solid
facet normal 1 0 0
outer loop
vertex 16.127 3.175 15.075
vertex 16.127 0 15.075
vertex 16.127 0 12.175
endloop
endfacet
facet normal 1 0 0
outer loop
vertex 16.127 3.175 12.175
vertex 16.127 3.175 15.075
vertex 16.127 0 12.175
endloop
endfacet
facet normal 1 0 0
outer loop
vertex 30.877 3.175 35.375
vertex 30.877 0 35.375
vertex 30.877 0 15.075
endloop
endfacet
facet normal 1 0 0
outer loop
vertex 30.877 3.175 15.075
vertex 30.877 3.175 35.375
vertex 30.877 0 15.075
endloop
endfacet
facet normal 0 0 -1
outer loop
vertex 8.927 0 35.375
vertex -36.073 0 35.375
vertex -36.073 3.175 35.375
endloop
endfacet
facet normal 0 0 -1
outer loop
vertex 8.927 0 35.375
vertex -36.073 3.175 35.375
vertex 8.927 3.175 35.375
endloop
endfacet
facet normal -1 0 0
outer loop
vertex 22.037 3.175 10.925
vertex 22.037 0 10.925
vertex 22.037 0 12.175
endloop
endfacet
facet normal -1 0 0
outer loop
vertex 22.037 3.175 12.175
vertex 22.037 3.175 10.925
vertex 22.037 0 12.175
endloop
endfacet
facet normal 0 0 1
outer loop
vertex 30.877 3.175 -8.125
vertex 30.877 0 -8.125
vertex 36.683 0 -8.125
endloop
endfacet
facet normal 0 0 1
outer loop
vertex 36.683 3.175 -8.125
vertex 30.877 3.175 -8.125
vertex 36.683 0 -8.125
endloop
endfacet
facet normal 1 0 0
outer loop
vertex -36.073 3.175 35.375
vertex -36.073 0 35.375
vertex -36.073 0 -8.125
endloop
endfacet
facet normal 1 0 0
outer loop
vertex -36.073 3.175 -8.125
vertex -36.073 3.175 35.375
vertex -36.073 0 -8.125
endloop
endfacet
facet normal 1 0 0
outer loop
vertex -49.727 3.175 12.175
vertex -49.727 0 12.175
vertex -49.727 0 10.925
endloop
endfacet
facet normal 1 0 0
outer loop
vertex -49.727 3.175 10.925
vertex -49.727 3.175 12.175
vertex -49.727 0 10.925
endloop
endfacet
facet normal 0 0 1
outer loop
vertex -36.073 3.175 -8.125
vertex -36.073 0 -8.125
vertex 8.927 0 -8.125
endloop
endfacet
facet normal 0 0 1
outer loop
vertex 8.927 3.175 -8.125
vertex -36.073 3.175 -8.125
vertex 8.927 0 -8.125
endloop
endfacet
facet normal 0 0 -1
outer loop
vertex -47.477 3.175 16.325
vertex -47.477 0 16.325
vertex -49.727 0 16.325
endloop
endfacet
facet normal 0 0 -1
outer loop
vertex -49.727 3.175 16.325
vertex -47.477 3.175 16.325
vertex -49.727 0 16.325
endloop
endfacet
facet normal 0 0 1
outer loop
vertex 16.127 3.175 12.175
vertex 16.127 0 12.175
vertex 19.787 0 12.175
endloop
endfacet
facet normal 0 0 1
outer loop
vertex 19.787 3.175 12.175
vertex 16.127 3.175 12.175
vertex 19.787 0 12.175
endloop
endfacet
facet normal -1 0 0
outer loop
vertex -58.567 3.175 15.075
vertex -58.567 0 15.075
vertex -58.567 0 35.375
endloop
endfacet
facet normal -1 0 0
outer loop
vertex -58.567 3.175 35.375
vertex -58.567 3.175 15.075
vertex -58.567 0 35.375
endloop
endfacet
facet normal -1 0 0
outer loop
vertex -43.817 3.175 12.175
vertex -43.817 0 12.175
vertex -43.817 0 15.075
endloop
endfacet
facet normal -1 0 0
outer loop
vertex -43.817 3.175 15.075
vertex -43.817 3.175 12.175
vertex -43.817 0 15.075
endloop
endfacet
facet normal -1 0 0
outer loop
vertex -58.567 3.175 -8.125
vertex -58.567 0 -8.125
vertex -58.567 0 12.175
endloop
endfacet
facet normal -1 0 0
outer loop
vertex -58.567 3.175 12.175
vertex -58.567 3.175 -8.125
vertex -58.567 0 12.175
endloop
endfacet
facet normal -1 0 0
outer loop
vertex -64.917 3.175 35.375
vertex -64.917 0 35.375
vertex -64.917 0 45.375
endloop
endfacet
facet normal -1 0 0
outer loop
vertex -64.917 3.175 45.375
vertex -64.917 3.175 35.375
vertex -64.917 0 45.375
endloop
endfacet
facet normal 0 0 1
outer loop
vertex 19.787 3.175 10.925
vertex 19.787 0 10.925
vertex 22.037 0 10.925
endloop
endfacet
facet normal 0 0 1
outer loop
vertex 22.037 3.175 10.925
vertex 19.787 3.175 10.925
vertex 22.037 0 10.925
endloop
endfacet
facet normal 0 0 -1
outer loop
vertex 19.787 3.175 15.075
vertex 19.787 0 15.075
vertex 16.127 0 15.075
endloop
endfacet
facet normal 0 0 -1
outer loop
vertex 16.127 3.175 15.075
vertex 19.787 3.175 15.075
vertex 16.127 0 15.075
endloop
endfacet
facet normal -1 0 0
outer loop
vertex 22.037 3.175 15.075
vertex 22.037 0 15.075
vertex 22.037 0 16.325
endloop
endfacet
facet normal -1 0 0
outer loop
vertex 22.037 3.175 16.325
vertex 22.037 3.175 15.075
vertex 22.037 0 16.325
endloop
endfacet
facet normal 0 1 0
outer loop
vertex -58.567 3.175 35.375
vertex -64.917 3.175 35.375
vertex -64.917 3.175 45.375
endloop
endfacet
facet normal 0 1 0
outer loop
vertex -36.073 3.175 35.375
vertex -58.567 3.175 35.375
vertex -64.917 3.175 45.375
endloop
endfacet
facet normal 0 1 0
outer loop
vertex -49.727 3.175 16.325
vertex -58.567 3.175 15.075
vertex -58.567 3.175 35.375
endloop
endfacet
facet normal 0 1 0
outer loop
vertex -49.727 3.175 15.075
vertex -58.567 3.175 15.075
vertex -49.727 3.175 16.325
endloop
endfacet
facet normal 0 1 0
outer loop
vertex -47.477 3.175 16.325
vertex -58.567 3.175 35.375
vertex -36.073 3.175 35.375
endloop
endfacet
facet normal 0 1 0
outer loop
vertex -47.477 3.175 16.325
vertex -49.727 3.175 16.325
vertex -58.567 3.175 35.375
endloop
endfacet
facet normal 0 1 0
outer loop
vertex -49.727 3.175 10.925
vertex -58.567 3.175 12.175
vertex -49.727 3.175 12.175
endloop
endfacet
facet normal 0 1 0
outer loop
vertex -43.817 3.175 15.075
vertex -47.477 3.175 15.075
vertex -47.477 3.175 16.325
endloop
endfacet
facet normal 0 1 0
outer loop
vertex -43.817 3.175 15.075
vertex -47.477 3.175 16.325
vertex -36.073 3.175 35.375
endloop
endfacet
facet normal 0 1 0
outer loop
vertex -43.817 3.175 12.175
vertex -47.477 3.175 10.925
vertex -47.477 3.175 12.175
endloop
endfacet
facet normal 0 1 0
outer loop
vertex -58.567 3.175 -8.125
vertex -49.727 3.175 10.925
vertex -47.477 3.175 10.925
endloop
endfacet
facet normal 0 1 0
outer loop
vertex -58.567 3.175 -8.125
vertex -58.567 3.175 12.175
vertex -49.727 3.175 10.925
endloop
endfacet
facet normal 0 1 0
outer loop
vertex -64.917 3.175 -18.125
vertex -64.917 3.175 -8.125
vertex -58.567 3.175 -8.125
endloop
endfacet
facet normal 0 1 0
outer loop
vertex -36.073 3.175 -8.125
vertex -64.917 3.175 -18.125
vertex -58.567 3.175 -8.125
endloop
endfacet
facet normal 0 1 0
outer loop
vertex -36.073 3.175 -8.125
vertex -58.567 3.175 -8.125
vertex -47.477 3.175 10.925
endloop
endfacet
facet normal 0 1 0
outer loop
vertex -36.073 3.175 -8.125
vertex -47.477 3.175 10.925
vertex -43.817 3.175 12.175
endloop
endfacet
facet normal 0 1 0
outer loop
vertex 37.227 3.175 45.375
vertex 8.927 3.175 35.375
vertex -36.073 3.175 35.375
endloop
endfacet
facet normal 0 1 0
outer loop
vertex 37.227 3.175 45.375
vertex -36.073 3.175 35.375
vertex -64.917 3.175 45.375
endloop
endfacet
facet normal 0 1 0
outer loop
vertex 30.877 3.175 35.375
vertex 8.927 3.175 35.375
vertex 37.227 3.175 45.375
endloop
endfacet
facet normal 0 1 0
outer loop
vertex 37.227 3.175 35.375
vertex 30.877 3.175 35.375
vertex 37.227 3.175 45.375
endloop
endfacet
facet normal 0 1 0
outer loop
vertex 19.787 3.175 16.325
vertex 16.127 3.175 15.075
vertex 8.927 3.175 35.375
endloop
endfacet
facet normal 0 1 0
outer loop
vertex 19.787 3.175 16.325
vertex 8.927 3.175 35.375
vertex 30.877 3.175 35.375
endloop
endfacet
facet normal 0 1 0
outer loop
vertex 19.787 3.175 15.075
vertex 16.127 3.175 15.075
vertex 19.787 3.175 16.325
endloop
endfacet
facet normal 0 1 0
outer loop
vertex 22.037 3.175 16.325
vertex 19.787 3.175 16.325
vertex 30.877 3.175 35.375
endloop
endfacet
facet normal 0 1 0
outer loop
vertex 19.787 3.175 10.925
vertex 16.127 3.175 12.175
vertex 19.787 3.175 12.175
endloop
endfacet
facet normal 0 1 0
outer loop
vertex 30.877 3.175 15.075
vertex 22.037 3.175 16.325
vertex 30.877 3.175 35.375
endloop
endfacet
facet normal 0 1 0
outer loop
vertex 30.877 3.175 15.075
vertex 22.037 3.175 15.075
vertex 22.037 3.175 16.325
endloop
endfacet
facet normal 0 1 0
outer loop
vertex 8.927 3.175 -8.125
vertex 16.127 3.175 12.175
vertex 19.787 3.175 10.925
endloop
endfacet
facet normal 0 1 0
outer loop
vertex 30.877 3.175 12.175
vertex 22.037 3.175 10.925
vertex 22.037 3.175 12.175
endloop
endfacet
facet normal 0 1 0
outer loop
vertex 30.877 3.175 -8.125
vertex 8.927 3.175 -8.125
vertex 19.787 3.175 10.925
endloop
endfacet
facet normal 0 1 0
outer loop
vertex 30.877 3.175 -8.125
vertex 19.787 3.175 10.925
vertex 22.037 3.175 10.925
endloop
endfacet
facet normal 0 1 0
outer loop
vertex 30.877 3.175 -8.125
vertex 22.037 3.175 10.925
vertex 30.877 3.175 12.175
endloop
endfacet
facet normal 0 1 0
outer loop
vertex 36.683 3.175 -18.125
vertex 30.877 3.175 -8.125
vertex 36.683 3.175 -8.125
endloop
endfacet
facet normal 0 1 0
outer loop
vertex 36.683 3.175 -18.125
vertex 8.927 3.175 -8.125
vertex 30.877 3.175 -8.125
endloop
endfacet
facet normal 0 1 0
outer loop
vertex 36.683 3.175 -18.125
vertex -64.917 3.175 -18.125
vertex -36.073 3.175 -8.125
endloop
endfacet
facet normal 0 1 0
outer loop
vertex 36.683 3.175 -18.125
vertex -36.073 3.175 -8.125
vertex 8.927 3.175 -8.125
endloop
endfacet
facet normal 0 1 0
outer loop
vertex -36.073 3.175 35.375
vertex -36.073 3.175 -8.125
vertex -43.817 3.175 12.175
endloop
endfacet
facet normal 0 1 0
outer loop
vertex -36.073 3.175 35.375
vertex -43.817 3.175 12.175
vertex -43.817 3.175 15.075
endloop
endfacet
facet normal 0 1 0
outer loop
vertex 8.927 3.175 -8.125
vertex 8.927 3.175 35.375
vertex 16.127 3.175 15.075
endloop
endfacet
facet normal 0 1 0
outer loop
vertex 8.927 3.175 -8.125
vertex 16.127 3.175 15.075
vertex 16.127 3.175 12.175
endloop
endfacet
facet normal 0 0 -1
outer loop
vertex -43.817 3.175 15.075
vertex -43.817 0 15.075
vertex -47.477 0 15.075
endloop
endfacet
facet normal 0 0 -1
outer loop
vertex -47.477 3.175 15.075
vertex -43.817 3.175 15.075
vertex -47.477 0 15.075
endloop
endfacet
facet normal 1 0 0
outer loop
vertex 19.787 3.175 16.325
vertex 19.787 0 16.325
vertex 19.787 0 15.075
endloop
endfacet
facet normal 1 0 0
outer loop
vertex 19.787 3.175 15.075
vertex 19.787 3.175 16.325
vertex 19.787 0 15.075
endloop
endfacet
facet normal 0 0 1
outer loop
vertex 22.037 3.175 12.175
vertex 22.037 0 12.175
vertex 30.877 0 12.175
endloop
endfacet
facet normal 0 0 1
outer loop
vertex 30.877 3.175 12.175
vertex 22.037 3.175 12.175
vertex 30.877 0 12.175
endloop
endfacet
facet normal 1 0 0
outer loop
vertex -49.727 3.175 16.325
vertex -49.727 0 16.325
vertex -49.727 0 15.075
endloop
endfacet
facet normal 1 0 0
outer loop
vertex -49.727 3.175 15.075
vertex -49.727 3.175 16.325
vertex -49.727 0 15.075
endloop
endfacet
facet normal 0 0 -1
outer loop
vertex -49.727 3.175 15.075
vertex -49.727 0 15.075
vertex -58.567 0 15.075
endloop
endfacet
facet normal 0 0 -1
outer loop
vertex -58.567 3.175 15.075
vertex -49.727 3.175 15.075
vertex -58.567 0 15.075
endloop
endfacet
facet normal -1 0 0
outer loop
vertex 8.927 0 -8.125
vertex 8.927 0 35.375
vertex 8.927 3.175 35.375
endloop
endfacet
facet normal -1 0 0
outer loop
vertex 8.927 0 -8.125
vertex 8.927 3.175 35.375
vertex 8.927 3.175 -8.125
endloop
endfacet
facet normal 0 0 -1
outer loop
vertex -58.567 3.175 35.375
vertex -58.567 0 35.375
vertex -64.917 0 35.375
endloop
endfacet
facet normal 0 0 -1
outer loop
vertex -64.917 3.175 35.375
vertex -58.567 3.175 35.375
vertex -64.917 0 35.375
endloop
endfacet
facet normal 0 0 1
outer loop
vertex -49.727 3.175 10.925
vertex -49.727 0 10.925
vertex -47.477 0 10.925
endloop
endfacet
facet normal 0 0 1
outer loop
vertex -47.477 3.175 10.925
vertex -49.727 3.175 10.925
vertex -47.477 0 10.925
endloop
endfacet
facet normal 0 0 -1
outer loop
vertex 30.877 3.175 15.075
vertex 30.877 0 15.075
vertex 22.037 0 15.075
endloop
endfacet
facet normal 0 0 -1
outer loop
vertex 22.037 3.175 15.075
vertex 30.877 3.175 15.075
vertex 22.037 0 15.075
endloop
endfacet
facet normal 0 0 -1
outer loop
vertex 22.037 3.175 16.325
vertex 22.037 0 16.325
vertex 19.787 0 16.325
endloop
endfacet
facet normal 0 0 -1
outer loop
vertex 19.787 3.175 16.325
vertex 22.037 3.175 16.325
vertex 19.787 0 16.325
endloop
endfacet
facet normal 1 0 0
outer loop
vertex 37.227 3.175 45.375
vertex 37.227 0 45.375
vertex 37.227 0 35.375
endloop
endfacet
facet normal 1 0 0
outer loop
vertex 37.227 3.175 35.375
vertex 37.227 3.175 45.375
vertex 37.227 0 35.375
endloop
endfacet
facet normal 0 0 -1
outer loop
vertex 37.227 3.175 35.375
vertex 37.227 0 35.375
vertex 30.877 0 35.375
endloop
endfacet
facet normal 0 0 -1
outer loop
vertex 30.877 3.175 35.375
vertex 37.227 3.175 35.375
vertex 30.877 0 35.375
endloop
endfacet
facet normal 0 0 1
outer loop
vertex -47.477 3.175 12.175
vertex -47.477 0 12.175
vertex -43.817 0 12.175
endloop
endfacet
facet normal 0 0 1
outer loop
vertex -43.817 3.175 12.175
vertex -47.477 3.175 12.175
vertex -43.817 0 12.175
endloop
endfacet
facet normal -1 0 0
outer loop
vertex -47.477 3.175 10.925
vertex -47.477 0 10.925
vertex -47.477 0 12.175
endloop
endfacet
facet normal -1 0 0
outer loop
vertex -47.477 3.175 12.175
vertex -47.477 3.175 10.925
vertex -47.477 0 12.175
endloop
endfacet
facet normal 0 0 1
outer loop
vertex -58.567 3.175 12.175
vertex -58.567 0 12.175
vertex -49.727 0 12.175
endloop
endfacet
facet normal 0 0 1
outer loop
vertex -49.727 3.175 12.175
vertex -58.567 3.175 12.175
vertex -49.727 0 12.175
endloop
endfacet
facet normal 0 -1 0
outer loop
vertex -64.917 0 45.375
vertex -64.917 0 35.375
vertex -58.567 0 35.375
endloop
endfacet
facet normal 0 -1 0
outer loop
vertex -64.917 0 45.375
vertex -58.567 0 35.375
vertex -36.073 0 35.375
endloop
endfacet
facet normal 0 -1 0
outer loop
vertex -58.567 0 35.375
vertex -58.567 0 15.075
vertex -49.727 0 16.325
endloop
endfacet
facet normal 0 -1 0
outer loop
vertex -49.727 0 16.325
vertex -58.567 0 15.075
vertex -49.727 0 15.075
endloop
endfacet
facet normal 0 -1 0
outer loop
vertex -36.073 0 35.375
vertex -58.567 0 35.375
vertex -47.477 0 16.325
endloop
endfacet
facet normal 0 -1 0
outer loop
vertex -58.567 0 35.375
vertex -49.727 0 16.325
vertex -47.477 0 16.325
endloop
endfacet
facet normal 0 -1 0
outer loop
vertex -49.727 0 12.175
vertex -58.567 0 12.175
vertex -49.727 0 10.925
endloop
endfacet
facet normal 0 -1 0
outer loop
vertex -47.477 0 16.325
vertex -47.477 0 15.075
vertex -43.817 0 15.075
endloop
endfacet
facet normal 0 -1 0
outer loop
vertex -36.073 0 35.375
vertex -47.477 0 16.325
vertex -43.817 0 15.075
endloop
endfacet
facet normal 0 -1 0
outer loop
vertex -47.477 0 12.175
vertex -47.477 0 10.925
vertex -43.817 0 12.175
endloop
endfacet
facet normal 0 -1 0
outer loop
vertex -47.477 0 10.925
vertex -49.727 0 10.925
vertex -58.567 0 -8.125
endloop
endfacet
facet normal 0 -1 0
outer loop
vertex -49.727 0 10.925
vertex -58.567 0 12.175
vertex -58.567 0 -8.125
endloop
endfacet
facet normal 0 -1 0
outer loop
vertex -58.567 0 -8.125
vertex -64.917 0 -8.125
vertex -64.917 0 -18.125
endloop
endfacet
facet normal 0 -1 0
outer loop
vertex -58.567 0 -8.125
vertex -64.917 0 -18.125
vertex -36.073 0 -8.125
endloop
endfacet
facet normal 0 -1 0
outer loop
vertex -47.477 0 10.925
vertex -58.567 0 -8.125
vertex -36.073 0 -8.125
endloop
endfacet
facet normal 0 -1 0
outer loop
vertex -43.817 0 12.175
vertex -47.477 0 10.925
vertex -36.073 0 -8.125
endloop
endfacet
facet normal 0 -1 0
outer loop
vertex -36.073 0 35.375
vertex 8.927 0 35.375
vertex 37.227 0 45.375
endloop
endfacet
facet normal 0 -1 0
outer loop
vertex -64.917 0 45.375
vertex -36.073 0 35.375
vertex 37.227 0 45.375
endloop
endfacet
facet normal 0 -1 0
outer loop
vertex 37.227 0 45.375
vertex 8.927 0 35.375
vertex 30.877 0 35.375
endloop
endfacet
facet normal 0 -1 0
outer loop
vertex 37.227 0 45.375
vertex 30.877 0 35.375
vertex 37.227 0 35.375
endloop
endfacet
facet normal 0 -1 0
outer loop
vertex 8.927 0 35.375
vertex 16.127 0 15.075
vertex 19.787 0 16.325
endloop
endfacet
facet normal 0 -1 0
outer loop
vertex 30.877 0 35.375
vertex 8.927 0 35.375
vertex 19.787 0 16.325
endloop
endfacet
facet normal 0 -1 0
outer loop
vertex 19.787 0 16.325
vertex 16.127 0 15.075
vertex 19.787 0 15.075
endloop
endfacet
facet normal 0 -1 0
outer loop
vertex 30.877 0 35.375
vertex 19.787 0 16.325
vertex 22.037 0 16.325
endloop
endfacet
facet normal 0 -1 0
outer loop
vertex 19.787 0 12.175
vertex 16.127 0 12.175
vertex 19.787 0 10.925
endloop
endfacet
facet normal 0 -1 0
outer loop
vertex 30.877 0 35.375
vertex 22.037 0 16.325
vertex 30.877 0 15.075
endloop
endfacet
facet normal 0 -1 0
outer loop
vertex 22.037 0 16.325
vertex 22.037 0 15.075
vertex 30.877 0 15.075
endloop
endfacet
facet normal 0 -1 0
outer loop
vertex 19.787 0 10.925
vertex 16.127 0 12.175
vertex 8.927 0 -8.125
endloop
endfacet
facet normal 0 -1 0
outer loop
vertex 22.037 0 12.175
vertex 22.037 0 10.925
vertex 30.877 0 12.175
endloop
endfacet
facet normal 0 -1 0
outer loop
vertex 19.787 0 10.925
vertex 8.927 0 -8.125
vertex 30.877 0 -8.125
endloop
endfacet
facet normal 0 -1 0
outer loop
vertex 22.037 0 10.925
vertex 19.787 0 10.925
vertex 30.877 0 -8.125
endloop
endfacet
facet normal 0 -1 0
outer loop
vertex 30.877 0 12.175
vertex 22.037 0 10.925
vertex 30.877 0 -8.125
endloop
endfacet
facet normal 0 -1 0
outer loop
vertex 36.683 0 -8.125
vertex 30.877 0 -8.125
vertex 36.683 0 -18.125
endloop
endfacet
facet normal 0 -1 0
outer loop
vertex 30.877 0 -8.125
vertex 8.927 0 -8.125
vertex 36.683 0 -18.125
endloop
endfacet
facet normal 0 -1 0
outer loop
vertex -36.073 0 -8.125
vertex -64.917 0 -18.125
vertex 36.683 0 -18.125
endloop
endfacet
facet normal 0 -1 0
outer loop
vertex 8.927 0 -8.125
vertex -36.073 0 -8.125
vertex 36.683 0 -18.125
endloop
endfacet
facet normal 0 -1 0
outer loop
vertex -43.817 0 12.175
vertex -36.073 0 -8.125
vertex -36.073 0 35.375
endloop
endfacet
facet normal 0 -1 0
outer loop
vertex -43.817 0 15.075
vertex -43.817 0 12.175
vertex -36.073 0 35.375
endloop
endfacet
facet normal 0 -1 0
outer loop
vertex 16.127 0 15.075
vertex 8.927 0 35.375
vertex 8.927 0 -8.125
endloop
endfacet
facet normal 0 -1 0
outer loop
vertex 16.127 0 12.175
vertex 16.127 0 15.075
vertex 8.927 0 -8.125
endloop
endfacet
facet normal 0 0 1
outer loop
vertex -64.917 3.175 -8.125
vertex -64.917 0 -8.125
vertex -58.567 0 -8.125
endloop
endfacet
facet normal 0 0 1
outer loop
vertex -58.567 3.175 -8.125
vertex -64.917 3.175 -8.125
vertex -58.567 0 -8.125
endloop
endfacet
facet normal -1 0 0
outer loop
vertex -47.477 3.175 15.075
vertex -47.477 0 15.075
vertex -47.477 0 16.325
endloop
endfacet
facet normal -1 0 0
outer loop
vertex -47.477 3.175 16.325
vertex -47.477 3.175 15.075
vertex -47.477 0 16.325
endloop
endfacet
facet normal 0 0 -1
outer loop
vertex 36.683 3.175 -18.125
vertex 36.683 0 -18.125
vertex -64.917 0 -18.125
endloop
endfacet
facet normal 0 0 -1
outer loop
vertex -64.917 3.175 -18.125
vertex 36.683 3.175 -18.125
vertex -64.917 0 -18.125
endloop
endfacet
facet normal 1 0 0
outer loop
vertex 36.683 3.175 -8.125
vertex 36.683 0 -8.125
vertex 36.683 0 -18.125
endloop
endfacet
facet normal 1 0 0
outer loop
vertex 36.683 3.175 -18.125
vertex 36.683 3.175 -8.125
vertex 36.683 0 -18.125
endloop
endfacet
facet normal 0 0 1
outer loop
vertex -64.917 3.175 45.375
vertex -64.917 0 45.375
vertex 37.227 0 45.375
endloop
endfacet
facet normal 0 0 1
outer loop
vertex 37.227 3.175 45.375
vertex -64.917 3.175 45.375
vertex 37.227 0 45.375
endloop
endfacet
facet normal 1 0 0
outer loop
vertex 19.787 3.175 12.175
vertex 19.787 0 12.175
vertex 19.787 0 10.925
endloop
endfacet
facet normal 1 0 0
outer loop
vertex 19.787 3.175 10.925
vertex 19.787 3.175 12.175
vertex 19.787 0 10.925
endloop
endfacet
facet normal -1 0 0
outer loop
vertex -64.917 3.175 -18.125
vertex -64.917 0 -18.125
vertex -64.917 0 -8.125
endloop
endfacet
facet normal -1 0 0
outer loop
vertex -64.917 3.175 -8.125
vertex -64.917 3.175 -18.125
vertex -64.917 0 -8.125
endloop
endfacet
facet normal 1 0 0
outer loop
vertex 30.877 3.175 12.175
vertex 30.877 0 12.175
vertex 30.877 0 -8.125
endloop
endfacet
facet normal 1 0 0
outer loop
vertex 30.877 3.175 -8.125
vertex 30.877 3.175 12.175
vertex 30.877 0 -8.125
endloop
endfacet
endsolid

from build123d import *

# Parameters (mm, degrees)
SKETCH1_W      = 45
SKETCH1_H      = 43.5
EXTRUDE1_DEPTH = 3.175


with BuildPart() as part:
    # Sketch1 → Extrude1 (new body)
    with BuildSketch(Plane(origin=(0, 0, 0), x_dir=(1, 0, 0), z_dir=(0, 1, 0))):
        Polygon((37.227457893, -45.375264395), (37.227457893, -35.375264395), (30.877457893, -35.375264395), (30.877457893, -15.075264395), (22.037457893, -15.075264395), (22.037457893, -16.325264395), (19.787457893, -16.325264395), (19.787457893, -15.075264395), (16.127457893, -15.075264395), (16.127457893, -12.175264395), (19.787457893, -12.175264395), (19.787457893, -10.925264395), (22.037457893, -10.925264395), (22.037457893, -12.175264395), (30.877457893, -12.175264395), (30.877457893, 8.124735605), (36.682921964, 8.124735605), (36.682921964, 18.124735605), (-64.917078036, 18.124735605), (-64.917078036, 8.124735605), (-58.567078036, 8.124735605), (-58.567078036, -12.175264395), (-49.727078036, -12.175264395), (-49.727078036, -10.925264395), (-47.477078036, -10.925264395), (-47.477078036, -12.175264395), (-43.817078036, -12.175264395), (-43.817078036, -15.075264395), (-47.477078036, -15.075264395), (-47.477078036, -16.325264395), (-49.727078036, -16.325264395), (-49.727078036, -15.075264395), (-58.567078036, -15.075264395), (-58.567078036, -35.375264395), (-64.917078036, -35.375264395), (-64.917078036, -45.375264395), align=None)
        with Locations((-13.572542107, -13.625264395)):
            Rectangle(SKETCH1_W, SKETCH1_H, mode=Mode.SUBTRACT)
    extrude(amount=EXTRUDE1_DEPTH)


solid = part.part
